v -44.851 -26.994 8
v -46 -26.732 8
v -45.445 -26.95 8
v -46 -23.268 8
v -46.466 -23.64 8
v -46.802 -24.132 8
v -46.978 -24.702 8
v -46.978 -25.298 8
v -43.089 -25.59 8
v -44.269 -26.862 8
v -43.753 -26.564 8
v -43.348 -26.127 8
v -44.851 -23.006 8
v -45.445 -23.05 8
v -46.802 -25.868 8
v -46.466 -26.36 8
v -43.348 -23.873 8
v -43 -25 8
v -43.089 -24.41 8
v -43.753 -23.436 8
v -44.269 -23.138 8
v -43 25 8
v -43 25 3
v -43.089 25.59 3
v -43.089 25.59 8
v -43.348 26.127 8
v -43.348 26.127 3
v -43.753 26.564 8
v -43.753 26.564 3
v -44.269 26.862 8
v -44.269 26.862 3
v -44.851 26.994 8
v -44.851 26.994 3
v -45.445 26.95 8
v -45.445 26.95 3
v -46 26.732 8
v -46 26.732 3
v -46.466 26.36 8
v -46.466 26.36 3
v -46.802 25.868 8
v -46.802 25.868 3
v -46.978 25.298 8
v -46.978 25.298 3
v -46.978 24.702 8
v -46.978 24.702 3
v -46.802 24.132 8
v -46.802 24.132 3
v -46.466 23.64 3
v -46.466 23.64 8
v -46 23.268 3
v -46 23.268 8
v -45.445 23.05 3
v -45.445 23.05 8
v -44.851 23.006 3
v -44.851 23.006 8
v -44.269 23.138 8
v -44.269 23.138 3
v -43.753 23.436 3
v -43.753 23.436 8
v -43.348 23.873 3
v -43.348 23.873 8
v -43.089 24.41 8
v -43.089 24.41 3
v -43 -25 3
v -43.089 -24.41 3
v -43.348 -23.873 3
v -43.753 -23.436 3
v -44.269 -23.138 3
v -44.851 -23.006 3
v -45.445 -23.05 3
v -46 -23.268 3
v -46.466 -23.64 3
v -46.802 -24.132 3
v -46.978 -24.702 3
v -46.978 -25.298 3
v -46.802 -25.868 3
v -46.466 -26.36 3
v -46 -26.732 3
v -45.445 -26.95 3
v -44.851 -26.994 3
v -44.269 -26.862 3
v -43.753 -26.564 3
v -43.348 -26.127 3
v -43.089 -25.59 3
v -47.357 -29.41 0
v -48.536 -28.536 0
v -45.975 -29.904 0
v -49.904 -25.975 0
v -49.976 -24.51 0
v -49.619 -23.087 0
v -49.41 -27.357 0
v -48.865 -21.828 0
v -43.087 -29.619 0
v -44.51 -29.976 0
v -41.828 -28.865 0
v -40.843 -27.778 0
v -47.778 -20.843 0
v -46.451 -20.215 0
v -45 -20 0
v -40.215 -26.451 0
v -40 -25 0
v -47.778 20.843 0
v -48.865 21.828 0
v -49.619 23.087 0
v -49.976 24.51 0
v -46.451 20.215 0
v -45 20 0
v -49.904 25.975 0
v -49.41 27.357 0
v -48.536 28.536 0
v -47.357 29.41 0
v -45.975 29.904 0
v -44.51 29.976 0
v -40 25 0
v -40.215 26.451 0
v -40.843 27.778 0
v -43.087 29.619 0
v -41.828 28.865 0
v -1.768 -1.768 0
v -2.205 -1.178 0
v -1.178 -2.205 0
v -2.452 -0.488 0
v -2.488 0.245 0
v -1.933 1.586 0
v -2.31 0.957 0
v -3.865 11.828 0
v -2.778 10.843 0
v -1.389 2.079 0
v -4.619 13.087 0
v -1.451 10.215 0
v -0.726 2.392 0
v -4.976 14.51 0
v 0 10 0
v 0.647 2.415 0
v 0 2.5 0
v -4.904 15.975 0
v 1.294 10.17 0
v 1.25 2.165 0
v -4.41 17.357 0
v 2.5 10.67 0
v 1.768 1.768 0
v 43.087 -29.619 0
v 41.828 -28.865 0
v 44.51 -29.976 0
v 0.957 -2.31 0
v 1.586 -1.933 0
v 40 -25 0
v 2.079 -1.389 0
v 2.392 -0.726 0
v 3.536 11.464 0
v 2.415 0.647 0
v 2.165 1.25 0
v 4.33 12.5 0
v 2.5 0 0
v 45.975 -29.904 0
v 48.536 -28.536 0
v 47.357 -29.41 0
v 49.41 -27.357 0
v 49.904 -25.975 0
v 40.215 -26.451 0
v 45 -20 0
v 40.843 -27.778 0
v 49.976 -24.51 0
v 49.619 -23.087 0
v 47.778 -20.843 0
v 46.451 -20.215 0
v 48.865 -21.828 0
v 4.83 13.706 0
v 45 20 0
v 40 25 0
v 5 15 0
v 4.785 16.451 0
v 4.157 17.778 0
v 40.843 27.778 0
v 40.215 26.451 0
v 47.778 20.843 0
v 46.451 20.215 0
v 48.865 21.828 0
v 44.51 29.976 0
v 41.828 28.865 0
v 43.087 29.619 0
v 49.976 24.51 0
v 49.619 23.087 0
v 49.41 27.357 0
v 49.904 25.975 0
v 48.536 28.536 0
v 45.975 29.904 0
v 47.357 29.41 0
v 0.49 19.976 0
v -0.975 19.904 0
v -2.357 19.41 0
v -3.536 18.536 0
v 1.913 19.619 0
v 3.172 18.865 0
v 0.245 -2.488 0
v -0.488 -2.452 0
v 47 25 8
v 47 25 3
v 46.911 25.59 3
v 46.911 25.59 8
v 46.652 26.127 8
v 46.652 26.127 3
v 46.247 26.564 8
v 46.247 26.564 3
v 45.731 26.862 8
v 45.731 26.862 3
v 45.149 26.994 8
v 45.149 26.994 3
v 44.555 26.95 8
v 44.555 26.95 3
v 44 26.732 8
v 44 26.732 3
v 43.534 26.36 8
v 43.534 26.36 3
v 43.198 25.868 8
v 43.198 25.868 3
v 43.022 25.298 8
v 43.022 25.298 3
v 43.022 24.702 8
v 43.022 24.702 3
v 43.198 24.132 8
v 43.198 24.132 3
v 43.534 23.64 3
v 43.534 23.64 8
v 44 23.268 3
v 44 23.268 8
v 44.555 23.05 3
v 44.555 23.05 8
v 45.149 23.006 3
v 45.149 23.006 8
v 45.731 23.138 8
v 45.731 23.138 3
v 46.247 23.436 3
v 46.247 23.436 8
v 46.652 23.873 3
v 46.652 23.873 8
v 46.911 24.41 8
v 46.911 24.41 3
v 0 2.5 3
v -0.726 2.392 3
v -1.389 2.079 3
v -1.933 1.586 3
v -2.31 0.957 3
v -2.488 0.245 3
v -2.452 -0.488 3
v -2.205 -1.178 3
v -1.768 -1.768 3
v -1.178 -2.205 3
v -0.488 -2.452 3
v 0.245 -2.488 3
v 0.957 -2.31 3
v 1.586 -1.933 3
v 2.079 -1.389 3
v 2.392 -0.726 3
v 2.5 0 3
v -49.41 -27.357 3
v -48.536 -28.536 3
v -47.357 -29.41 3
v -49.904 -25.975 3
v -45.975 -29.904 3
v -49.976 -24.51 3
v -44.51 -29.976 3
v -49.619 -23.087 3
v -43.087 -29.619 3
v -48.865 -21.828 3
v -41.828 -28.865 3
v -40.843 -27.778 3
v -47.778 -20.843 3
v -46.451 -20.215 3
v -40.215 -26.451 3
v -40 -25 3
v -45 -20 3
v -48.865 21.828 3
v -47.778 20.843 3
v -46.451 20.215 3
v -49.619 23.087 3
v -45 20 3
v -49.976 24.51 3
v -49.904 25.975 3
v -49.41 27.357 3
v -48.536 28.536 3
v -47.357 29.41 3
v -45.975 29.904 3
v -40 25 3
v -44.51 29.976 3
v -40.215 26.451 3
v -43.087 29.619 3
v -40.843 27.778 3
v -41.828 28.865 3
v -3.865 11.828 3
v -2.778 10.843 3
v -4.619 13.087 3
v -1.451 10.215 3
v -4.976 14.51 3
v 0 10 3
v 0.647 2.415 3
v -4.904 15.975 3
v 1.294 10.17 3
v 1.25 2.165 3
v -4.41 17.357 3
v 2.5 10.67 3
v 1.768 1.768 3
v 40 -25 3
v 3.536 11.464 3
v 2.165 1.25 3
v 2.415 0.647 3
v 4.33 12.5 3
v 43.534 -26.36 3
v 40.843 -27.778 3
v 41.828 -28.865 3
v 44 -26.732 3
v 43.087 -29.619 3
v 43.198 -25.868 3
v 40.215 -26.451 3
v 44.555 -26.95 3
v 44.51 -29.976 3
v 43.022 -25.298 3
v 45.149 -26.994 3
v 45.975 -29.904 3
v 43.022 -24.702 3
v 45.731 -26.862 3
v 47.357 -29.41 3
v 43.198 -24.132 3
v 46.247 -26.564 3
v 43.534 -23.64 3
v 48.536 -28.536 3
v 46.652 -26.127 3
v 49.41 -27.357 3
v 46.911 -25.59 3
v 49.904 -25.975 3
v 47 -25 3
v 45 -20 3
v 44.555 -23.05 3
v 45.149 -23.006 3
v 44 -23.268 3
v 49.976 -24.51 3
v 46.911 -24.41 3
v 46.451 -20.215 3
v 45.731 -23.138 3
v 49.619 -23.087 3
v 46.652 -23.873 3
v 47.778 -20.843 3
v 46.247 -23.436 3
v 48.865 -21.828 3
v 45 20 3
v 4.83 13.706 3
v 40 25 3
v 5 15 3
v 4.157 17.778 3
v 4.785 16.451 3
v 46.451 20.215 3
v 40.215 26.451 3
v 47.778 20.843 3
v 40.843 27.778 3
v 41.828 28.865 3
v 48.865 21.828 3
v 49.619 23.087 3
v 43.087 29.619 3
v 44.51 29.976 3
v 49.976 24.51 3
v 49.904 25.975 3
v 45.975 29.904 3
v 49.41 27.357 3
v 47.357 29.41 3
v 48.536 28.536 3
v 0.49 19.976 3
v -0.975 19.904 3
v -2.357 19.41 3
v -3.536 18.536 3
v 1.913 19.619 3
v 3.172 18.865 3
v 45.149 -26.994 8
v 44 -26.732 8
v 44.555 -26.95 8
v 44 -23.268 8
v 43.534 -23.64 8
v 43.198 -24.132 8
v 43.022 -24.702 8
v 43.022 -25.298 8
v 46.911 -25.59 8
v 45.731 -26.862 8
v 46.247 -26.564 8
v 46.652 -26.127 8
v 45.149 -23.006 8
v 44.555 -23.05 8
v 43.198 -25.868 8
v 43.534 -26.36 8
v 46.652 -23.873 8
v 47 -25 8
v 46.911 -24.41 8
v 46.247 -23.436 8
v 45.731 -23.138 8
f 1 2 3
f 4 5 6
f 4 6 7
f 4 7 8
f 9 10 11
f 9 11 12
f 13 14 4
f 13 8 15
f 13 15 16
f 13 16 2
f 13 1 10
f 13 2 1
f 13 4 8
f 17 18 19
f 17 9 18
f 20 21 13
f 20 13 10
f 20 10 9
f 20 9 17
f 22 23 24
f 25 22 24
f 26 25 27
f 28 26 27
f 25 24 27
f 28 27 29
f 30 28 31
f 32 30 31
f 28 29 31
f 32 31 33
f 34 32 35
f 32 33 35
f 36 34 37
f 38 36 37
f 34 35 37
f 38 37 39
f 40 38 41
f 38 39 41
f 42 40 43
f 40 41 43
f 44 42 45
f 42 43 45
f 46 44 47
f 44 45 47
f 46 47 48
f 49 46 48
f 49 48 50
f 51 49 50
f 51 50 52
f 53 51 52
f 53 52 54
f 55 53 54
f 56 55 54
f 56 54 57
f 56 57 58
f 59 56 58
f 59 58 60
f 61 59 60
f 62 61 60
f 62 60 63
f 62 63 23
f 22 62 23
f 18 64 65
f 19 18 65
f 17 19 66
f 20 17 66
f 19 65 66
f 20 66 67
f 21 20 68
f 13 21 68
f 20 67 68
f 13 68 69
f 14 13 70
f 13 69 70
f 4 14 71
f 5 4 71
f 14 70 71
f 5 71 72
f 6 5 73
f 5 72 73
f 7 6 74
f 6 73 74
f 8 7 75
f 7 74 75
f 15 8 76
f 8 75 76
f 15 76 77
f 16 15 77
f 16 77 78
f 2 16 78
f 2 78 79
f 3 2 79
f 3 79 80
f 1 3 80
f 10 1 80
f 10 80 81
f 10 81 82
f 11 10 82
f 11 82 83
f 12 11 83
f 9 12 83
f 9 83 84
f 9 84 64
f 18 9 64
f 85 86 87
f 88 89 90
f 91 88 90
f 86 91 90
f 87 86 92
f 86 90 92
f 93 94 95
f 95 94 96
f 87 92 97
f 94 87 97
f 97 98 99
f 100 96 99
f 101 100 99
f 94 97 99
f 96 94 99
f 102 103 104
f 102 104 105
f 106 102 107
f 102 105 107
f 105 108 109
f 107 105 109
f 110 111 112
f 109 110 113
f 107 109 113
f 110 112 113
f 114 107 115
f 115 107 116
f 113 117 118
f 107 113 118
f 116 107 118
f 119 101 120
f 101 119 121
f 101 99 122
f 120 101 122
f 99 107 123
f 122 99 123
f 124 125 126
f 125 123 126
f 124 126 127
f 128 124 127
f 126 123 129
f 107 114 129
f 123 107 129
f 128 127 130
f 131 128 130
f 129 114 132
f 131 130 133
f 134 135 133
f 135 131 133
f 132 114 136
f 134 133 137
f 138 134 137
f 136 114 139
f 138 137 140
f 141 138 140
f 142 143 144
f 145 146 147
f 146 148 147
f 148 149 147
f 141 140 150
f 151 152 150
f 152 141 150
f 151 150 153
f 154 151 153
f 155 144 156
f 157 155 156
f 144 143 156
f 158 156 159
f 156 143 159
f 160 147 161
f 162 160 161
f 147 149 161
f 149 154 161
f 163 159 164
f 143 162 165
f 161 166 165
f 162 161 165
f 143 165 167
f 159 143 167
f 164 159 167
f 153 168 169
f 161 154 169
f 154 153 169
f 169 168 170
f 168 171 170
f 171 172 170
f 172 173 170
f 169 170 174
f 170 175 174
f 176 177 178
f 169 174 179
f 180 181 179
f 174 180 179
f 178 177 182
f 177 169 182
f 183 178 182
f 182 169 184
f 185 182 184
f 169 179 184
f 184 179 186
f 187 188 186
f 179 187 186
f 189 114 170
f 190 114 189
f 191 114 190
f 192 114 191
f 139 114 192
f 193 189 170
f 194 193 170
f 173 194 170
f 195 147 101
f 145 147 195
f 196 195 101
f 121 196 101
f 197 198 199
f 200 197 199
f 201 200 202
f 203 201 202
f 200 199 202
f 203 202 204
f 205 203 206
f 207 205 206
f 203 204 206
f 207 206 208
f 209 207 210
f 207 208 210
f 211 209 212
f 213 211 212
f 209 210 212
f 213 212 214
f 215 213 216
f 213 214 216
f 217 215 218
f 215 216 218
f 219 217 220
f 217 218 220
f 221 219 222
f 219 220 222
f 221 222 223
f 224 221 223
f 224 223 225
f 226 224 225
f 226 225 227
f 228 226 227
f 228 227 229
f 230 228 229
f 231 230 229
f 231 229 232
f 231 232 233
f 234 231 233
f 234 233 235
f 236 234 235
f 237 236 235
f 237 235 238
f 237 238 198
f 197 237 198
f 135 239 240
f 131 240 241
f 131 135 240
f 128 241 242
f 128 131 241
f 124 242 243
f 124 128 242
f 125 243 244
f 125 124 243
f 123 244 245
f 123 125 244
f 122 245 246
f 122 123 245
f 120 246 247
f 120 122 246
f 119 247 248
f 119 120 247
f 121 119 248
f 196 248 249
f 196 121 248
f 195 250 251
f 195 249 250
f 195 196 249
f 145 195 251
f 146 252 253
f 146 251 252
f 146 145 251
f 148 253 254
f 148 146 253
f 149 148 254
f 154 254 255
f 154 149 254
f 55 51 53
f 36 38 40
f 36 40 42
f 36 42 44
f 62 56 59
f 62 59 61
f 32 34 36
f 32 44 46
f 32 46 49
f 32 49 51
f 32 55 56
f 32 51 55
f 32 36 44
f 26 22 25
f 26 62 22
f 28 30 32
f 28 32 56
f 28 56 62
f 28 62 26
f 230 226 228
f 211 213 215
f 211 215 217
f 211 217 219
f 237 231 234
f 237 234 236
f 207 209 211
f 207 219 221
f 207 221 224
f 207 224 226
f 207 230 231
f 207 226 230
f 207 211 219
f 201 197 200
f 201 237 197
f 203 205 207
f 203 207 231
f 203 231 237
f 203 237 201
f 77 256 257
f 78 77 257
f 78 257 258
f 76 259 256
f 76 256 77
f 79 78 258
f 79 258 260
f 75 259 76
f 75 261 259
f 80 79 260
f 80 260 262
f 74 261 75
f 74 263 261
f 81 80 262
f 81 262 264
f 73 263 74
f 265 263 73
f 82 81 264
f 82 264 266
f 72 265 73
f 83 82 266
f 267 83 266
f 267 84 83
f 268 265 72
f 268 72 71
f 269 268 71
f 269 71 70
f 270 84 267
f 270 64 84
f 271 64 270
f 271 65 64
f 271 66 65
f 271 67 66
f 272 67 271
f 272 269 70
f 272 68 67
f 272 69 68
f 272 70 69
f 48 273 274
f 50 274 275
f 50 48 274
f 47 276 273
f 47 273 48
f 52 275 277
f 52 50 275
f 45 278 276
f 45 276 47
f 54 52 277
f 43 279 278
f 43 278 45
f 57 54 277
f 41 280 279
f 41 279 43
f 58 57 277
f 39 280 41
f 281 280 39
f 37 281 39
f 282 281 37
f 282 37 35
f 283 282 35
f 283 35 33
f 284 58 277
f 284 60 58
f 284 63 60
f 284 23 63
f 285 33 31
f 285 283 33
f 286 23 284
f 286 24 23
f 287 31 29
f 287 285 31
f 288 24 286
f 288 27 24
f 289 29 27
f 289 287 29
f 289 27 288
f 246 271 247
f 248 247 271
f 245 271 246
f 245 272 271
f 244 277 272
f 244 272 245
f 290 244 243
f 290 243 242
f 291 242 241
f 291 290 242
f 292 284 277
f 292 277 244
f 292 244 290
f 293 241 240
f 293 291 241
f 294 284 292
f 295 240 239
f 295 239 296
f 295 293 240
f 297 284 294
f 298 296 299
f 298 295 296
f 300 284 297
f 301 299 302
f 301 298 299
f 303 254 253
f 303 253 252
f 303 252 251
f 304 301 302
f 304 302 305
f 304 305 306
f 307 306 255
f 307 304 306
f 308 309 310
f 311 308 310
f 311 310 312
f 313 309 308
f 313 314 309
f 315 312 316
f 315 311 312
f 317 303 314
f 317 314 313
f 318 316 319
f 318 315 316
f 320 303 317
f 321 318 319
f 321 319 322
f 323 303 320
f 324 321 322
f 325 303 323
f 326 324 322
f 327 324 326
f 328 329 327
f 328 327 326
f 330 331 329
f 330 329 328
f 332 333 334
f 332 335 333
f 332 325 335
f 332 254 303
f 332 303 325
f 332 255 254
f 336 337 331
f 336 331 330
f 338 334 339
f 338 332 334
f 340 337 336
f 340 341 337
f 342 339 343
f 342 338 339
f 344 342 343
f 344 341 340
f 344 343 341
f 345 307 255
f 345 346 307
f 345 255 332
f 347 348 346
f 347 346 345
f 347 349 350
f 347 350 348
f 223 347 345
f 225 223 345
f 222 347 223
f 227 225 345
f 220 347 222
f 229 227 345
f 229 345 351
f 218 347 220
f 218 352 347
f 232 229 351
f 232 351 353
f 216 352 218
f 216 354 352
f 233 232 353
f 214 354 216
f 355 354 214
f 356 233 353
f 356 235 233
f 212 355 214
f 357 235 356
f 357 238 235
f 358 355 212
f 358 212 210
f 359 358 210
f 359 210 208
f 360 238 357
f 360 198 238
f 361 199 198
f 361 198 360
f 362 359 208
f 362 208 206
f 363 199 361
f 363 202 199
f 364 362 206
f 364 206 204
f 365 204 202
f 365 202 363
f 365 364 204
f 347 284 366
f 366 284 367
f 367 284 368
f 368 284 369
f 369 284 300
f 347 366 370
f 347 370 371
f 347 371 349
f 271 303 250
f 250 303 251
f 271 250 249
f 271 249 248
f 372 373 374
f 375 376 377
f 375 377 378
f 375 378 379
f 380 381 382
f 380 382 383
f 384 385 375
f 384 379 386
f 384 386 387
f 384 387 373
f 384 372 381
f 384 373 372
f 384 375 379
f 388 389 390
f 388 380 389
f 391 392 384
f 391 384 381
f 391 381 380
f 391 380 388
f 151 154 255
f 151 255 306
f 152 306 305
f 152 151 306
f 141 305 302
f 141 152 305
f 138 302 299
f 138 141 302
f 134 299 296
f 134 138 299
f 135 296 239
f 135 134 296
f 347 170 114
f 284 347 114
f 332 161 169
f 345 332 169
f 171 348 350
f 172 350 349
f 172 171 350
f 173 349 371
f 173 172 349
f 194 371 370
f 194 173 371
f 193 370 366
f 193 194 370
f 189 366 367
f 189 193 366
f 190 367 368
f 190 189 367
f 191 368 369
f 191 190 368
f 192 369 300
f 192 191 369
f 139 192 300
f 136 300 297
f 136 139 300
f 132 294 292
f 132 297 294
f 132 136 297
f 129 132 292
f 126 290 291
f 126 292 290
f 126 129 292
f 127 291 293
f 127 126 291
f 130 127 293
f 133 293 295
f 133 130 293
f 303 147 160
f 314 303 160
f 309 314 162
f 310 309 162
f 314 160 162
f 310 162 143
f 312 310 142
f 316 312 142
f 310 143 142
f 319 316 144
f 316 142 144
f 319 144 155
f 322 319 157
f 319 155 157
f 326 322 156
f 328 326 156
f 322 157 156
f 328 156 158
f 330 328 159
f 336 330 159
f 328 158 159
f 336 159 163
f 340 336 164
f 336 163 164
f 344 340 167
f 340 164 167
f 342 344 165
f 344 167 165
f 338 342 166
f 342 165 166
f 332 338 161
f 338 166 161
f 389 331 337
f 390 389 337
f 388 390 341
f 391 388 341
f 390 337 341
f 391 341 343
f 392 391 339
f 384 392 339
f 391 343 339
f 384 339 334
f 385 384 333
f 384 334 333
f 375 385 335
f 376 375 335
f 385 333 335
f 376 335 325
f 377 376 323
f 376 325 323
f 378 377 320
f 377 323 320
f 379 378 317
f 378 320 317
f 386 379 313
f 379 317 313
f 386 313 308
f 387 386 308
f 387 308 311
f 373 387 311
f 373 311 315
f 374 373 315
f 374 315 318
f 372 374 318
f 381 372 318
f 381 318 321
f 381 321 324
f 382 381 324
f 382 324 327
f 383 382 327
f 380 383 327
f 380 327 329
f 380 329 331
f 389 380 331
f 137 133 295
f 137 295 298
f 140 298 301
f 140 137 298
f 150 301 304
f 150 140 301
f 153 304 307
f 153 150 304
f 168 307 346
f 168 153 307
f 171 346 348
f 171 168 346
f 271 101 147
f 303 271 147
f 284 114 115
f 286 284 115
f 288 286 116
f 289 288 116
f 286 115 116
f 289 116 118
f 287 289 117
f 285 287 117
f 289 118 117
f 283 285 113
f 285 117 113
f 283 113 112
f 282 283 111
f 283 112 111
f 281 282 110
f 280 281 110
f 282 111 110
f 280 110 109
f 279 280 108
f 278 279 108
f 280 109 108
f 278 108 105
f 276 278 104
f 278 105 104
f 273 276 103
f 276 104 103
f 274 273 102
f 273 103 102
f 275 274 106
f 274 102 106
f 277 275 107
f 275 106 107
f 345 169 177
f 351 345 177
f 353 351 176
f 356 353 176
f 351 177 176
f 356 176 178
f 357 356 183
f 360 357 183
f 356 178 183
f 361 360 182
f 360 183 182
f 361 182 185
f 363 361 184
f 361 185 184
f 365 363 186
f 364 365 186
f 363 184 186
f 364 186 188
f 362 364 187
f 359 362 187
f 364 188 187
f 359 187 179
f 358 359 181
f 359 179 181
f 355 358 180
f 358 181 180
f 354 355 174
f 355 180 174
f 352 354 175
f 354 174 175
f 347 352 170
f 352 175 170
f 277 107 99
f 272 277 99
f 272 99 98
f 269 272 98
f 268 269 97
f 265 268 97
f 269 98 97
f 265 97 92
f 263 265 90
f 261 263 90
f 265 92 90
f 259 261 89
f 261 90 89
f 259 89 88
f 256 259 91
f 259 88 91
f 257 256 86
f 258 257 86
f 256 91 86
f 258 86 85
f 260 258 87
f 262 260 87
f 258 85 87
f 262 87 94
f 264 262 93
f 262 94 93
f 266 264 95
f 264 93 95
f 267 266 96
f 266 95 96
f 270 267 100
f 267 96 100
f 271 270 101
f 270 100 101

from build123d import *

# Parameters (mm, degrees)
F0_R     = 2
F1_DEPTH = 3
F2_DEPTH = 8
F4_DEPTH = 4


with BuildPart() as f1:
    # F0 (on Top) → F1 (new body)
    with BuildSketch(Plane.XY):
        with BuildLine():
            Line((40, 25), (-40, 25))
            ThreePointArc((-40, 25), (-48.535534, 28.535534), (-45, 20))
            Line((-45, 20), (-45, -20))
            ThreePointArc((-45, -20), (-48.535534, -28.535534), (-40, -25))
            Line((-40, -25), (40, -25))
            ThreePointArc((40, -25), (48.535534, -28.535534), (45, -20))
            Line((45, -20), (45, 20))
            ThreePointArc((45, 20), (48.535534, 28.535534), (40, 25))
        make_face()
        with Locations((-45, -25)):
            Circle(F0_R, mode=Mode.SUBTRACT)
        with Locations((45, -25)):
            Circle(F0_R, mode=Mode.SUBTRACT)
        with Locations((-45, 25)):
            Circle(F0_R, mode=Mode.SUBTRACT)
        with Locations((45, 25)):
            Circle(F0_R, mode=Mode.SUBTRACT)
    extrude(amount=F1_DEPTH)

    # F0 (on Top) → F2 (join)
    with BuildSketch(Plane.XY):
        with Locations((-45, -25)):
            Circle(F0_R)
        with Locations((45, -25)):
            Circle(F0_R)
        with Locations((45, 25)):
            Circle(F0_R)
        with Locations((-45, 25)):
            Circle(F0_R)
    extrude(amount=F2_DEPTH)

    # F3 (on Top) → F4 (cut)
    with BuildSketch(Plane.XY):
        with BuildLine():
            ThreePointArc((2.5, 0), (1.767767, 1.767767), (0, 2.5))
            ThreePointArc((0, 2.5), (-1.767767, -1.767767), (2.5, 0))
        make_face()
        with BuildLine():
            ThreePointArc((5, 15), (-3.535534, 18.535534), (0, 10))
            ThreePointArc((0, 10), (3.535534, 11.464466), (5, 15))
        make_face()
    extrude(amount=F4_DEPTH, mode=Mode.SUBTRACT)


solid = f1.part
